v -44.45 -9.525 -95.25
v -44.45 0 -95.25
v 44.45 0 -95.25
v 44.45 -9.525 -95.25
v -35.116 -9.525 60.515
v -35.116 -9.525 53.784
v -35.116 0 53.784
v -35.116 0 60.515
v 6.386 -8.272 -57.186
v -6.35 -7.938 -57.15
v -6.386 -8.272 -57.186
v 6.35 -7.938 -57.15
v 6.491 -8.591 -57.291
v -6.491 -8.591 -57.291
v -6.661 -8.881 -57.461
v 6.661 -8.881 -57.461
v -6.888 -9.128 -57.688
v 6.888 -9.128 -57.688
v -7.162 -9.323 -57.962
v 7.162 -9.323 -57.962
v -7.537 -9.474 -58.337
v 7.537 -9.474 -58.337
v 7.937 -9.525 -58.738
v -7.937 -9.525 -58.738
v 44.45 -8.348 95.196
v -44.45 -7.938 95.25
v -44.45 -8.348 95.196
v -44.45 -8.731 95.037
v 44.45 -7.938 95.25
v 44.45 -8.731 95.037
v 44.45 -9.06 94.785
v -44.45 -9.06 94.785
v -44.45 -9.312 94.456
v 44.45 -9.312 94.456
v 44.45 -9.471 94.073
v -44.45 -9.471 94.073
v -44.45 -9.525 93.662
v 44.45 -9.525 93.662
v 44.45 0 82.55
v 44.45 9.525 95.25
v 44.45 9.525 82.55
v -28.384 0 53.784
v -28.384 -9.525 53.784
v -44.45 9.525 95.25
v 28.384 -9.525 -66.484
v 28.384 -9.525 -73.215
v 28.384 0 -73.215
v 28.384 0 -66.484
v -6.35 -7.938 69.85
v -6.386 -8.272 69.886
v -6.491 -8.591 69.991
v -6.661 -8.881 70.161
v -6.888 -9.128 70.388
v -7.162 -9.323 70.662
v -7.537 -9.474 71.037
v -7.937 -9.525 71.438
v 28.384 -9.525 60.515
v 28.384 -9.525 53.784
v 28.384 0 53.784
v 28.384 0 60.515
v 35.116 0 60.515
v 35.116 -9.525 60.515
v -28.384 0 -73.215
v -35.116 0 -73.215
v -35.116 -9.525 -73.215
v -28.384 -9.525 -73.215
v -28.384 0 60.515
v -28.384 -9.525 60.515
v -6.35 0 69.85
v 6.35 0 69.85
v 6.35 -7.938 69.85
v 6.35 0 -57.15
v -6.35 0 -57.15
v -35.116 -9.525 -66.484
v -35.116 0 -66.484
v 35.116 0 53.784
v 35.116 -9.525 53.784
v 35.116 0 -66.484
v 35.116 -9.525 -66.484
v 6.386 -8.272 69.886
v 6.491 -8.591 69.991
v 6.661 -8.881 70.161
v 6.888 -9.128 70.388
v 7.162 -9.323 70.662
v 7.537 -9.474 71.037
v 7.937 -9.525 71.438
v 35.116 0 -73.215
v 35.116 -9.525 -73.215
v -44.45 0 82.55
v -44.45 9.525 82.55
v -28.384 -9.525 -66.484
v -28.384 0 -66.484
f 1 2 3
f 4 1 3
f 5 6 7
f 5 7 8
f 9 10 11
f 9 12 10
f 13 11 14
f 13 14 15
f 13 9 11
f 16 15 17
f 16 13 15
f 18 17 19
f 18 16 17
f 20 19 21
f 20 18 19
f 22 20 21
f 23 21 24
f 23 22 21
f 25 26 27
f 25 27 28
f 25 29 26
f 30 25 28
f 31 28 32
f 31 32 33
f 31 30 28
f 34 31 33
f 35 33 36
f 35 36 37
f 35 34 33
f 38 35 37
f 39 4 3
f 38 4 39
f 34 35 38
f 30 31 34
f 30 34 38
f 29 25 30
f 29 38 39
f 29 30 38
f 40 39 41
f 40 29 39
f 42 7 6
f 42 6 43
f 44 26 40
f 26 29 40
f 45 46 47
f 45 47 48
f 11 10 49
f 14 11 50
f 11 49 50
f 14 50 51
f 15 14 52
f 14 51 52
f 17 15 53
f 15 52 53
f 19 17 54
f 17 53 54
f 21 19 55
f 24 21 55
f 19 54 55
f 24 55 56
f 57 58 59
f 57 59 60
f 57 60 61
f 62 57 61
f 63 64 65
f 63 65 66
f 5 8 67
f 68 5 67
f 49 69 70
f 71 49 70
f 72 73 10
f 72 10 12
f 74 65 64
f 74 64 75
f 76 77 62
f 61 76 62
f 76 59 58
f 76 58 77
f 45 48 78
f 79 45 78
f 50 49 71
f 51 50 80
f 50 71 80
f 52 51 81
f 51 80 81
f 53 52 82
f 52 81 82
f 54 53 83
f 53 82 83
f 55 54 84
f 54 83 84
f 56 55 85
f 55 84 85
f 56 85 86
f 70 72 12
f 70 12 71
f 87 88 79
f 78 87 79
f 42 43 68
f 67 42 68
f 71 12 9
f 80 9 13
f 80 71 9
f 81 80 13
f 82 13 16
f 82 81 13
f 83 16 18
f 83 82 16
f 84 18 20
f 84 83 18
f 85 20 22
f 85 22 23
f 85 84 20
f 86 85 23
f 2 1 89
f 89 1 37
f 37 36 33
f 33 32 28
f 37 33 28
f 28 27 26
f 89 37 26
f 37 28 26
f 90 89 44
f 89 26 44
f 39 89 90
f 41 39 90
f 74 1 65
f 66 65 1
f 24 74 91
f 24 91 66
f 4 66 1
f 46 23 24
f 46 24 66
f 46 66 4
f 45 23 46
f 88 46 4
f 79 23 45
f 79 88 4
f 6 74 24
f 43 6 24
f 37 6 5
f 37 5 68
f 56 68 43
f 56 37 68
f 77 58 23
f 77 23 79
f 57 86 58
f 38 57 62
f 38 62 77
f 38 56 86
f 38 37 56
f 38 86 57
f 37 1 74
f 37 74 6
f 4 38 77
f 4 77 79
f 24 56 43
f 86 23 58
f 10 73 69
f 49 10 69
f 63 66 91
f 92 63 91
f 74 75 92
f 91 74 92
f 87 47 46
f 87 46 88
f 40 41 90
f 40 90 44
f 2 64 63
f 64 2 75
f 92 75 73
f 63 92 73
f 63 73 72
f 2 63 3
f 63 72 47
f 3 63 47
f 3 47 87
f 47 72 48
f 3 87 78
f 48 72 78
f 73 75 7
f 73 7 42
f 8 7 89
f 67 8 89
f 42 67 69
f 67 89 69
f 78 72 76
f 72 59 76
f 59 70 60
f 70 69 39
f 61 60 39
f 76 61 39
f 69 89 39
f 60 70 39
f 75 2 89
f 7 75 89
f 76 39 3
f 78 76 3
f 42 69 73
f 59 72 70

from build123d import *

# Parameters (mm, degrees)
F0_W     = 88.9
F0_H     = 190.5
F0_W_2   = 6.731
F0_H_2   = 6.731
F0_W_3   = 12.7
F0_H_3   = 127
F1_DEPTH = 9.525
F2_R     = 1.5875
F3_W     = 9.525
F3_H     = 12.7
F4_DEPTH = 44.45


with BuildPart() as f1:
    # F0 (on Front) → F1 (new body)
    with BuildSketch(Plane.XZ):
        Rectangle(F0_W, F0_H)
        with Locations((-31.75, -69.85)):
            Rectangle(F0_W_2, F0_H_2, mode=Mode.SUBTRACT)
        with Locations((31.75, -69.85)):
            Rectangle(F0_W_2, F0_H_2, mode=Mode.SUBTRACT)
        with Locations((-31.75, 57.15)):
            Rectangle(F0_W_2, F0_H_2, mode=Mode.SUBTRACT)
        with Locations((0, 6.35)):
            Rectangle(F0_W_3, F0_H_3, mode=Mode.SUBTRACT)
        with Locations((31.75, 57.15)):
            Rectangle(F0_W_2, F0_H_2, mode=Mode.SUBTRACT)
    extrude(amount=F1_DEPTH)

    # F2
    f2_edges = [f1.edges().sort_by_distance(p)[0] for p in [
        (0, -9.525, 95.25),
        (-6.35, -9.525, 6.35),
        (6.35, -9.525, 6.35),
        (0, -9.525, 69.85),
        (0, -9.525, -57.15),
    ]]
    fillet(f2_edges, radius=F2_R)

    # F3 (on Right) → F4 (join, symmetric)
    with BuildSketch(Plane.YZ):
        with Locations((4.7625, 88.9)):
            Rectangle(F3_W, F3_H)
    extrude(amount=F4_DEPTH, both=True)


solid = f1.part
